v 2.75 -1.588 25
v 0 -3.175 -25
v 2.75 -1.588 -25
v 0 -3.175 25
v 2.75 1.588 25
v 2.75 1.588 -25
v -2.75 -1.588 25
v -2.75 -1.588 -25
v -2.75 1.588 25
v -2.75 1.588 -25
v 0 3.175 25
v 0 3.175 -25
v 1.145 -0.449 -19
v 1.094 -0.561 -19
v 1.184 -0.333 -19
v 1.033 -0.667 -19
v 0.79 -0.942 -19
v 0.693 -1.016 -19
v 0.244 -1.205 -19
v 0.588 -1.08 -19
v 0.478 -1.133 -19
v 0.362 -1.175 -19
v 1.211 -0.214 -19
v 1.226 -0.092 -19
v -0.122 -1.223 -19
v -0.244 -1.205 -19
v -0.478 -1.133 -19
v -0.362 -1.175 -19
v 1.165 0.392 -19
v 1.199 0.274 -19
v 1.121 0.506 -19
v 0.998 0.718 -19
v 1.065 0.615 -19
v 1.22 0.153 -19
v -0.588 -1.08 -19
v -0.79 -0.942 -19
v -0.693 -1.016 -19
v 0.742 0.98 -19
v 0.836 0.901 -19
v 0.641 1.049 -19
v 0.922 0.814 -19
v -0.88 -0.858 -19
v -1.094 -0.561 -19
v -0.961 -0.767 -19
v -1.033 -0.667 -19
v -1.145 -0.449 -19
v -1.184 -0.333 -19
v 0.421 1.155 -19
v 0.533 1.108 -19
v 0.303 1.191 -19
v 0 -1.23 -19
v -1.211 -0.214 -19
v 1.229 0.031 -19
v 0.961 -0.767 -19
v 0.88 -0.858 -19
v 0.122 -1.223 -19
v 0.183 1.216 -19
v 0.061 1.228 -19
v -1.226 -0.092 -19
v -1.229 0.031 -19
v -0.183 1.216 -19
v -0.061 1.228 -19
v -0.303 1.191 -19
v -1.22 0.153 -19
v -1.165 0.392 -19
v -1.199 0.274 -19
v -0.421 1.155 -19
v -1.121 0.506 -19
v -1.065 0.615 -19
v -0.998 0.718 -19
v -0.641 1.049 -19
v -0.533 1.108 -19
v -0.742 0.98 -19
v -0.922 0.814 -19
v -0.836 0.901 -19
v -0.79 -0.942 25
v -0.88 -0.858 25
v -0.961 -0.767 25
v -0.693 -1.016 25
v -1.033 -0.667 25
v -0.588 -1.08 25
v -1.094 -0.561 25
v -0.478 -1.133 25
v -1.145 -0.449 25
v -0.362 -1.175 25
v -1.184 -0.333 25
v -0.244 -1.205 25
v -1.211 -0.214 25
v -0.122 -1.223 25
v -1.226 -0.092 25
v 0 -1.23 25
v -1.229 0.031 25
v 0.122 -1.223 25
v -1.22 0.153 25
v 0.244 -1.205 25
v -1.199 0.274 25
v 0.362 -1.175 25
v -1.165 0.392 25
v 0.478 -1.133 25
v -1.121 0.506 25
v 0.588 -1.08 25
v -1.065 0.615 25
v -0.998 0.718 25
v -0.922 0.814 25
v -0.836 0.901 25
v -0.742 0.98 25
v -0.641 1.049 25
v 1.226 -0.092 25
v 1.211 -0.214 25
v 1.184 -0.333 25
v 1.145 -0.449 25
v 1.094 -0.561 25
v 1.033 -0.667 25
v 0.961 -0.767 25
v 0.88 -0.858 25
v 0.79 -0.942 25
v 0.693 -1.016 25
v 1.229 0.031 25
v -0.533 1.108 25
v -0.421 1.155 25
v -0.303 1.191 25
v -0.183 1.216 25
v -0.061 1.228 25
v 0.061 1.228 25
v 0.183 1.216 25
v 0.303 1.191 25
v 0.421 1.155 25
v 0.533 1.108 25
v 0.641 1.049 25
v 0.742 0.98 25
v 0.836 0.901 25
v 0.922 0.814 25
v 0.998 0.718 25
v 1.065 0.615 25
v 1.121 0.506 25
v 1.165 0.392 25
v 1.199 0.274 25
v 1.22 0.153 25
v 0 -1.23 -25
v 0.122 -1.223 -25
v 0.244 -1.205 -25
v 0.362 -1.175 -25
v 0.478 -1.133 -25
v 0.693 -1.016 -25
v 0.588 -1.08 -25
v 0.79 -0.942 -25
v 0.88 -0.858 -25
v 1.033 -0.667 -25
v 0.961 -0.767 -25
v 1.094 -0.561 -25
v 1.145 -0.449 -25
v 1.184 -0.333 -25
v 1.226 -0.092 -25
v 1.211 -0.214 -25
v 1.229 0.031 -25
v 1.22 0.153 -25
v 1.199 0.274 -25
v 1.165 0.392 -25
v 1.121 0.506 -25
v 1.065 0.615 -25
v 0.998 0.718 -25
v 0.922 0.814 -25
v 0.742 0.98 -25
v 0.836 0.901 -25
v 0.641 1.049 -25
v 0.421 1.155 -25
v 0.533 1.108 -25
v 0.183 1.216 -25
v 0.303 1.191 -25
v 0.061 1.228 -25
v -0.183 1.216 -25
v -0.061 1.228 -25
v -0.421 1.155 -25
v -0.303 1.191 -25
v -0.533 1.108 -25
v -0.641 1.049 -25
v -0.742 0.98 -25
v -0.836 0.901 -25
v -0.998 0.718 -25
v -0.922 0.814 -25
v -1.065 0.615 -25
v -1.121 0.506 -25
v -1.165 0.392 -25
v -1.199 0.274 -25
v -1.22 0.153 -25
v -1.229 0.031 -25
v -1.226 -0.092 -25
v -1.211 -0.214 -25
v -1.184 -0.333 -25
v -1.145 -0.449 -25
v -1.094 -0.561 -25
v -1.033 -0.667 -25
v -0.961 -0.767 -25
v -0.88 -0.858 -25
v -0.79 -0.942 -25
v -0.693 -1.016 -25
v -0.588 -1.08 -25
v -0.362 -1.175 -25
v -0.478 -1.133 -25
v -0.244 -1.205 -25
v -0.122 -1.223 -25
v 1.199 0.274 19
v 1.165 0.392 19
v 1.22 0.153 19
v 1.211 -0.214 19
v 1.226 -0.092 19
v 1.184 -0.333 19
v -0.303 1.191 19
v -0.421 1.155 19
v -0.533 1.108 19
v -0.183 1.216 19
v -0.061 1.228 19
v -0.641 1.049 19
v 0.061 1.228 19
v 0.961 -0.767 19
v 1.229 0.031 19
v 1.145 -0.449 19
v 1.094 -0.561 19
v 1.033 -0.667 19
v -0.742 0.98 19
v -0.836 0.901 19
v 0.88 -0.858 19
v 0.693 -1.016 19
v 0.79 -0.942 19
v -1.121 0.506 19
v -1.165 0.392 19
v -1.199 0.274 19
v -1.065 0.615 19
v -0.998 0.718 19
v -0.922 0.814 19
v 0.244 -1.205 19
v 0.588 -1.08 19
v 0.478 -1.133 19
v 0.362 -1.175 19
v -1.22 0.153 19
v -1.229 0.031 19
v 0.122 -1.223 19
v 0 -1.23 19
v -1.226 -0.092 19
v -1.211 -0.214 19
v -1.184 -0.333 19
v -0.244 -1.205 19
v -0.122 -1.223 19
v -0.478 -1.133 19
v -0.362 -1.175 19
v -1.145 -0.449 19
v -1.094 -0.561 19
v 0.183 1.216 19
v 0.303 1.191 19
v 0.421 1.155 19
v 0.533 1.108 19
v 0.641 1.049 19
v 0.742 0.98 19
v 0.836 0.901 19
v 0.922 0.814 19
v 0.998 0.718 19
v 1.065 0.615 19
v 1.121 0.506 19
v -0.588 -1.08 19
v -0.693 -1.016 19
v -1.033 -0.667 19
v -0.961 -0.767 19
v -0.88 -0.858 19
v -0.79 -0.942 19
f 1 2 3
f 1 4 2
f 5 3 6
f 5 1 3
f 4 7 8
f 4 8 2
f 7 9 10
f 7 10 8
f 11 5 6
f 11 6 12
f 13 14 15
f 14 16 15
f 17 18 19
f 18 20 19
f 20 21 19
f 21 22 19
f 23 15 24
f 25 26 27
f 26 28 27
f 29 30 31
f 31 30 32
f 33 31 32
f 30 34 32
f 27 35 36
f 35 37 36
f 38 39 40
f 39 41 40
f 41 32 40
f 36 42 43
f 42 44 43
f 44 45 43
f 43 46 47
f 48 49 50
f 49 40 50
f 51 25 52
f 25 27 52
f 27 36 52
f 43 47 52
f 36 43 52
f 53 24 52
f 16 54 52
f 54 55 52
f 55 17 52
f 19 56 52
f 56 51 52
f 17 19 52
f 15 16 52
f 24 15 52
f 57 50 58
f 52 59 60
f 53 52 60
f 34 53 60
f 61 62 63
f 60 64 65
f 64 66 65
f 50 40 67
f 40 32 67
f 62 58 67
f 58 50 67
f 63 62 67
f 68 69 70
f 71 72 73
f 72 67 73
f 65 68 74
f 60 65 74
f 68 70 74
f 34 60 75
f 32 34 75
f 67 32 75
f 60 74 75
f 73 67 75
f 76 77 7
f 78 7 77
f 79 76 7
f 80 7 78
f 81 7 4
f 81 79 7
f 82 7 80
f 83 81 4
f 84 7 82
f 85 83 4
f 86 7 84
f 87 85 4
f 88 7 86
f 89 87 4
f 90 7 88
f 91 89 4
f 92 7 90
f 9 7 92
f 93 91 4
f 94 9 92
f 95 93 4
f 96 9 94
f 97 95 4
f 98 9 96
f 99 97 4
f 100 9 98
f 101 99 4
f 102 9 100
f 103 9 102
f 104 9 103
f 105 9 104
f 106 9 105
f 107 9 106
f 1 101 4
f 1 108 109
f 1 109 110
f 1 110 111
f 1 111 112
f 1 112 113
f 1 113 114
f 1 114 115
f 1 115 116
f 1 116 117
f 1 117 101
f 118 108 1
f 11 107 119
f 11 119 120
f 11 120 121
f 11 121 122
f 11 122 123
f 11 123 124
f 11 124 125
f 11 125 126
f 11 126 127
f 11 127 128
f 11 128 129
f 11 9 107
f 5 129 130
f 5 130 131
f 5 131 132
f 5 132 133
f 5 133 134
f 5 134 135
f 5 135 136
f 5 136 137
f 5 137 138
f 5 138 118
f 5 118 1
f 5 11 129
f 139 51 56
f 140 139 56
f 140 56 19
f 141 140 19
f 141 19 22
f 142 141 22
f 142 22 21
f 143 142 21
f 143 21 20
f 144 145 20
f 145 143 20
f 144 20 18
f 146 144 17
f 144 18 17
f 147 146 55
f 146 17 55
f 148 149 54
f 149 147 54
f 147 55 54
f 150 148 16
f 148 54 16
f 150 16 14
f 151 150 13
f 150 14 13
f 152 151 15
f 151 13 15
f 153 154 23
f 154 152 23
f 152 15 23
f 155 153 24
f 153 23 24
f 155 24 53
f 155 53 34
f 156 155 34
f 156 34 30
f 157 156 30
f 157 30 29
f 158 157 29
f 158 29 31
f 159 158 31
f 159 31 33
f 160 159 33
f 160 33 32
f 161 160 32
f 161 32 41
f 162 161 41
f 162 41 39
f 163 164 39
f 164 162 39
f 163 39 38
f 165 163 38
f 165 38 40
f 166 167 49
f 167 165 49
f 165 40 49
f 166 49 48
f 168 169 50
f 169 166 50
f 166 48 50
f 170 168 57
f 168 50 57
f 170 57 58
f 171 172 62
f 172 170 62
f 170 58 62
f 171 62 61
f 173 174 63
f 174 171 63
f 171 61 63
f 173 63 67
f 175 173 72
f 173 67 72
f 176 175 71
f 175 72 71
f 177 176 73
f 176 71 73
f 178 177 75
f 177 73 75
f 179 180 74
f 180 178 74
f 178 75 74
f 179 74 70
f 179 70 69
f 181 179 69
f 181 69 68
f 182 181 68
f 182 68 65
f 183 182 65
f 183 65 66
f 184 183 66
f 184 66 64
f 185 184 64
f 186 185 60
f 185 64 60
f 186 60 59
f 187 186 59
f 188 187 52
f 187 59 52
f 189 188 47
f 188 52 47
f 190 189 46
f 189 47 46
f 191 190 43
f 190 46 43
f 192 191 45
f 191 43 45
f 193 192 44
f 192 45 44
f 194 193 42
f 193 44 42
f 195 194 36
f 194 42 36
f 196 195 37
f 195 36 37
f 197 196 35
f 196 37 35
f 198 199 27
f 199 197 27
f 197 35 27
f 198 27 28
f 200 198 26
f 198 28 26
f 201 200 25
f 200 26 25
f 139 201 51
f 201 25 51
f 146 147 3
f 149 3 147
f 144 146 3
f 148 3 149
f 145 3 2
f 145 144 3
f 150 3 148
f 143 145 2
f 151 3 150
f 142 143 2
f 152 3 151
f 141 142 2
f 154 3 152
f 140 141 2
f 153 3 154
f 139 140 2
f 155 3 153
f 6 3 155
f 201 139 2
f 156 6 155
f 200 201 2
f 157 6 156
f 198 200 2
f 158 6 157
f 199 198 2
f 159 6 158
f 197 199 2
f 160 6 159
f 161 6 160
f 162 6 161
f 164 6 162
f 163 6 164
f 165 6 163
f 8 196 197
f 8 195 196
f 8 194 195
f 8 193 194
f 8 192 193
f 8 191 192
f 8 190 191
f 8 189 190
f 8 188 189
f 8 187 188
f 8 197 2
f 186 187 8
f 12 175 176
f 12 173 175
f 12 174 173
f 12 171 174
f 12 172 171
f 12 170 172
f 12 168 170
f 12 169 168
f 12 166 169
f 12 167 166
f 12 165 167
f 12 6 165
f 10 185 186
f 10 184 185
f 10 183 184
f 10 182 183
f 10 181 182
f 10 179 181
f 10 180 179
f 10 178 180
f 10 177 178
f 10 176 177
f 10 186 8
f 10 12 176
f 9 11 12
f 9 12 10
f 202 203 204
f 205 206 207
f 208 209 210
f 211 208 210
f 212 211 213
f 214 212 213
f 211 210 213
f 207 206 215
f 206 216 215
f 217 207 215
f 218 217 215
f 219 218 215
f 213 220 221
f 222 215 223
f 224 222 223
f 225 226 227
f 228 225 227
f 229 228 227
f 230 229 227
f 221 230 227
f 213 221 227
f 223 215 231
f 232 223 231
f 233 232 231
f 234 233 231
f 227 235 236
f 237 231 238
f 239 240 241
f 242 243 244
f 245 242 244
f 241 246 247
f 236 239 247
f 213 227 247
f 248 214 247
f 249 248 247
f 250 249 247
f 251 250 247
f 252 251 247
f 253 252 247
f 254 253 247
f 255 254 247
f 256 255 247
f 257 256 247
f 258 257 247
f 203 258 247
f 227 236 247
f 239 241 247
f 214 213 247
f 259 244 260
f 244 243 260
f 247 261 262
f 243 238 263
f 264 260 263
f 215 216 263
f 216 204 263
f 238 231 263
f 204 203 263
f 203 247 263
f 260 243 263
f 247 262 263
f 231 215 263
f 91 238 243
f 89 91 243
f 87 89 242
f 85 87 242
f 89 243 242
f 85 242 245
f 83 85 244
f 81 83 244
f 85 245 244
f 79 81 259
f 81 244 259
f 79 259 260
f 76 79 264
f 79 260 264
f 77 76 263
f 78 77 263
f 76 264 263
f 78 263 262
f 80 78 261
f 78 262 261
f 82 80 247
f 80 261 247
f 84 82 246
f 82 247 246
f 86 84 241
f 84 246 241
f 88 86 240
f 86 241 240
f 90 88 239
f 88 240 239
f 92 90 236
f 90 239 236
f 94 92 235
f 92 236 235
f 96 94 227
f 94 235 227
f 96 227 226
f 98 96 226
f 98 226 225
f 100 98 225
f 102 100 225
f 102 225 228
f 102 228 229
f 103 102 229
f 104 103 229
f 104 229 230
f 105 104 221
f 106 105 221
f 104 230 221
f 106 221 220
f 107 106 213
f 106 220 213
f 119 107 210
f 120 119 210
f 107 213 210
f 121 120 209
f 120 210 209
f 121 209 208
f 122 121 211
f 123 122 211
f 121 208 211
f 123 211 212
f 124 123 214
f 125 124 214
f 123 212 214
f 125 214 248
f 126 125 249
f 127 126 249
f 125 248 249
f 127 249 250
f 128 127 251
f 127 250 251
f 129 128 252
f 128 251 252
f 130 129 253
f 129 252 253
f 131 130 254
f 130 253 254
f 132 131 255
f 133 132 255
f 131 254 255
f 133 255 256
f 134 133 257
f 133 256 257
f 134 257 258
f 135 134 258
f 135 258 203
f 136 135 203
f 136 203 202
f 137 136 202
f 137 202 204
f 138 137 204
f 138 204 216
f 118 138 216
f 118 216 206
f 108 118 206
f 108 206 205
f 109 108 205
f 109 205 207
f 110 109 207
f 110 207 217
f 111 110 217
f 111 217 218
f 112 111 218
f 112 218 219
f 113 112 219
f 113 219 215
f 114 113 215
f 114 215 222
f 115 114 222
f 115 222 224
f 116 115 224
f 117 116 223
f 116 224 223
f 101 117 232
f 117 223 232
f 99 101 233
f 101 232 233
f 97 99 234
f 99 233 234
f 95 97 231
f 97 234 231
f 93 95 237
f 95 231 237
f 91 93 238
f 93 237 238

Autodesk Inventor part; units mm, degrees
ref_plane "YZ Plane" through (0, 0, 0) normal (1, 0, 0) x (0, 1, 0)
ref_plane "XZ Plane" through (0, 0, 0) normal (0, 1, 0) x (-1, 0, 0)
ref_plane "XY Plane" through (0, 0, 0) normal (0, 0, 1) x (1, 0, 0)
sketch "スケッチ1" plane through (0, 0, 0) normal (0, 0, 1) x (1, 0, 0)
  line L0 (2.75, 1.5877) -> (2.75, -1.5877)
  line L1 (2.75, -1.5877) -> (0, -3.1754)
  line L2 (0, -3.1754) -> (-2.75, -1.5877)
  line L3 (-2.75, -1.5877) -> (-2.75, 1.5877)
  line L4 (-2.75, 1.5877) -> (0, 3.1754)
  line L5 (0, 3.1754) -> (2.75, 1.5877)
  point P0 (0, 0)
  point P1 (0, 0)
  dimension "d0" = 5.5
extrude "押し出し1" add sketch "スケッチ1" along normal blind 25
sketch "スケッチ2" plane through (0, 0, 25) normal (0, 0, 1) x (1, 0, 0)
  point P0 (0, 0)
  point P1 (0, 0)
hole "穴1" at (0, 0, 25) direction (0, 0, -1) diameter 2.459 depth 6 thread size "M3x0.5" class "6H" standard "ISO Metric profile"
mirror "ミラー1" about plane through (0, 0, 0) normal (0, 0, -1) of "押し出し1", "穴1"
properties part number "ASU-340" material "ステンレス鋼 AISI 304"
